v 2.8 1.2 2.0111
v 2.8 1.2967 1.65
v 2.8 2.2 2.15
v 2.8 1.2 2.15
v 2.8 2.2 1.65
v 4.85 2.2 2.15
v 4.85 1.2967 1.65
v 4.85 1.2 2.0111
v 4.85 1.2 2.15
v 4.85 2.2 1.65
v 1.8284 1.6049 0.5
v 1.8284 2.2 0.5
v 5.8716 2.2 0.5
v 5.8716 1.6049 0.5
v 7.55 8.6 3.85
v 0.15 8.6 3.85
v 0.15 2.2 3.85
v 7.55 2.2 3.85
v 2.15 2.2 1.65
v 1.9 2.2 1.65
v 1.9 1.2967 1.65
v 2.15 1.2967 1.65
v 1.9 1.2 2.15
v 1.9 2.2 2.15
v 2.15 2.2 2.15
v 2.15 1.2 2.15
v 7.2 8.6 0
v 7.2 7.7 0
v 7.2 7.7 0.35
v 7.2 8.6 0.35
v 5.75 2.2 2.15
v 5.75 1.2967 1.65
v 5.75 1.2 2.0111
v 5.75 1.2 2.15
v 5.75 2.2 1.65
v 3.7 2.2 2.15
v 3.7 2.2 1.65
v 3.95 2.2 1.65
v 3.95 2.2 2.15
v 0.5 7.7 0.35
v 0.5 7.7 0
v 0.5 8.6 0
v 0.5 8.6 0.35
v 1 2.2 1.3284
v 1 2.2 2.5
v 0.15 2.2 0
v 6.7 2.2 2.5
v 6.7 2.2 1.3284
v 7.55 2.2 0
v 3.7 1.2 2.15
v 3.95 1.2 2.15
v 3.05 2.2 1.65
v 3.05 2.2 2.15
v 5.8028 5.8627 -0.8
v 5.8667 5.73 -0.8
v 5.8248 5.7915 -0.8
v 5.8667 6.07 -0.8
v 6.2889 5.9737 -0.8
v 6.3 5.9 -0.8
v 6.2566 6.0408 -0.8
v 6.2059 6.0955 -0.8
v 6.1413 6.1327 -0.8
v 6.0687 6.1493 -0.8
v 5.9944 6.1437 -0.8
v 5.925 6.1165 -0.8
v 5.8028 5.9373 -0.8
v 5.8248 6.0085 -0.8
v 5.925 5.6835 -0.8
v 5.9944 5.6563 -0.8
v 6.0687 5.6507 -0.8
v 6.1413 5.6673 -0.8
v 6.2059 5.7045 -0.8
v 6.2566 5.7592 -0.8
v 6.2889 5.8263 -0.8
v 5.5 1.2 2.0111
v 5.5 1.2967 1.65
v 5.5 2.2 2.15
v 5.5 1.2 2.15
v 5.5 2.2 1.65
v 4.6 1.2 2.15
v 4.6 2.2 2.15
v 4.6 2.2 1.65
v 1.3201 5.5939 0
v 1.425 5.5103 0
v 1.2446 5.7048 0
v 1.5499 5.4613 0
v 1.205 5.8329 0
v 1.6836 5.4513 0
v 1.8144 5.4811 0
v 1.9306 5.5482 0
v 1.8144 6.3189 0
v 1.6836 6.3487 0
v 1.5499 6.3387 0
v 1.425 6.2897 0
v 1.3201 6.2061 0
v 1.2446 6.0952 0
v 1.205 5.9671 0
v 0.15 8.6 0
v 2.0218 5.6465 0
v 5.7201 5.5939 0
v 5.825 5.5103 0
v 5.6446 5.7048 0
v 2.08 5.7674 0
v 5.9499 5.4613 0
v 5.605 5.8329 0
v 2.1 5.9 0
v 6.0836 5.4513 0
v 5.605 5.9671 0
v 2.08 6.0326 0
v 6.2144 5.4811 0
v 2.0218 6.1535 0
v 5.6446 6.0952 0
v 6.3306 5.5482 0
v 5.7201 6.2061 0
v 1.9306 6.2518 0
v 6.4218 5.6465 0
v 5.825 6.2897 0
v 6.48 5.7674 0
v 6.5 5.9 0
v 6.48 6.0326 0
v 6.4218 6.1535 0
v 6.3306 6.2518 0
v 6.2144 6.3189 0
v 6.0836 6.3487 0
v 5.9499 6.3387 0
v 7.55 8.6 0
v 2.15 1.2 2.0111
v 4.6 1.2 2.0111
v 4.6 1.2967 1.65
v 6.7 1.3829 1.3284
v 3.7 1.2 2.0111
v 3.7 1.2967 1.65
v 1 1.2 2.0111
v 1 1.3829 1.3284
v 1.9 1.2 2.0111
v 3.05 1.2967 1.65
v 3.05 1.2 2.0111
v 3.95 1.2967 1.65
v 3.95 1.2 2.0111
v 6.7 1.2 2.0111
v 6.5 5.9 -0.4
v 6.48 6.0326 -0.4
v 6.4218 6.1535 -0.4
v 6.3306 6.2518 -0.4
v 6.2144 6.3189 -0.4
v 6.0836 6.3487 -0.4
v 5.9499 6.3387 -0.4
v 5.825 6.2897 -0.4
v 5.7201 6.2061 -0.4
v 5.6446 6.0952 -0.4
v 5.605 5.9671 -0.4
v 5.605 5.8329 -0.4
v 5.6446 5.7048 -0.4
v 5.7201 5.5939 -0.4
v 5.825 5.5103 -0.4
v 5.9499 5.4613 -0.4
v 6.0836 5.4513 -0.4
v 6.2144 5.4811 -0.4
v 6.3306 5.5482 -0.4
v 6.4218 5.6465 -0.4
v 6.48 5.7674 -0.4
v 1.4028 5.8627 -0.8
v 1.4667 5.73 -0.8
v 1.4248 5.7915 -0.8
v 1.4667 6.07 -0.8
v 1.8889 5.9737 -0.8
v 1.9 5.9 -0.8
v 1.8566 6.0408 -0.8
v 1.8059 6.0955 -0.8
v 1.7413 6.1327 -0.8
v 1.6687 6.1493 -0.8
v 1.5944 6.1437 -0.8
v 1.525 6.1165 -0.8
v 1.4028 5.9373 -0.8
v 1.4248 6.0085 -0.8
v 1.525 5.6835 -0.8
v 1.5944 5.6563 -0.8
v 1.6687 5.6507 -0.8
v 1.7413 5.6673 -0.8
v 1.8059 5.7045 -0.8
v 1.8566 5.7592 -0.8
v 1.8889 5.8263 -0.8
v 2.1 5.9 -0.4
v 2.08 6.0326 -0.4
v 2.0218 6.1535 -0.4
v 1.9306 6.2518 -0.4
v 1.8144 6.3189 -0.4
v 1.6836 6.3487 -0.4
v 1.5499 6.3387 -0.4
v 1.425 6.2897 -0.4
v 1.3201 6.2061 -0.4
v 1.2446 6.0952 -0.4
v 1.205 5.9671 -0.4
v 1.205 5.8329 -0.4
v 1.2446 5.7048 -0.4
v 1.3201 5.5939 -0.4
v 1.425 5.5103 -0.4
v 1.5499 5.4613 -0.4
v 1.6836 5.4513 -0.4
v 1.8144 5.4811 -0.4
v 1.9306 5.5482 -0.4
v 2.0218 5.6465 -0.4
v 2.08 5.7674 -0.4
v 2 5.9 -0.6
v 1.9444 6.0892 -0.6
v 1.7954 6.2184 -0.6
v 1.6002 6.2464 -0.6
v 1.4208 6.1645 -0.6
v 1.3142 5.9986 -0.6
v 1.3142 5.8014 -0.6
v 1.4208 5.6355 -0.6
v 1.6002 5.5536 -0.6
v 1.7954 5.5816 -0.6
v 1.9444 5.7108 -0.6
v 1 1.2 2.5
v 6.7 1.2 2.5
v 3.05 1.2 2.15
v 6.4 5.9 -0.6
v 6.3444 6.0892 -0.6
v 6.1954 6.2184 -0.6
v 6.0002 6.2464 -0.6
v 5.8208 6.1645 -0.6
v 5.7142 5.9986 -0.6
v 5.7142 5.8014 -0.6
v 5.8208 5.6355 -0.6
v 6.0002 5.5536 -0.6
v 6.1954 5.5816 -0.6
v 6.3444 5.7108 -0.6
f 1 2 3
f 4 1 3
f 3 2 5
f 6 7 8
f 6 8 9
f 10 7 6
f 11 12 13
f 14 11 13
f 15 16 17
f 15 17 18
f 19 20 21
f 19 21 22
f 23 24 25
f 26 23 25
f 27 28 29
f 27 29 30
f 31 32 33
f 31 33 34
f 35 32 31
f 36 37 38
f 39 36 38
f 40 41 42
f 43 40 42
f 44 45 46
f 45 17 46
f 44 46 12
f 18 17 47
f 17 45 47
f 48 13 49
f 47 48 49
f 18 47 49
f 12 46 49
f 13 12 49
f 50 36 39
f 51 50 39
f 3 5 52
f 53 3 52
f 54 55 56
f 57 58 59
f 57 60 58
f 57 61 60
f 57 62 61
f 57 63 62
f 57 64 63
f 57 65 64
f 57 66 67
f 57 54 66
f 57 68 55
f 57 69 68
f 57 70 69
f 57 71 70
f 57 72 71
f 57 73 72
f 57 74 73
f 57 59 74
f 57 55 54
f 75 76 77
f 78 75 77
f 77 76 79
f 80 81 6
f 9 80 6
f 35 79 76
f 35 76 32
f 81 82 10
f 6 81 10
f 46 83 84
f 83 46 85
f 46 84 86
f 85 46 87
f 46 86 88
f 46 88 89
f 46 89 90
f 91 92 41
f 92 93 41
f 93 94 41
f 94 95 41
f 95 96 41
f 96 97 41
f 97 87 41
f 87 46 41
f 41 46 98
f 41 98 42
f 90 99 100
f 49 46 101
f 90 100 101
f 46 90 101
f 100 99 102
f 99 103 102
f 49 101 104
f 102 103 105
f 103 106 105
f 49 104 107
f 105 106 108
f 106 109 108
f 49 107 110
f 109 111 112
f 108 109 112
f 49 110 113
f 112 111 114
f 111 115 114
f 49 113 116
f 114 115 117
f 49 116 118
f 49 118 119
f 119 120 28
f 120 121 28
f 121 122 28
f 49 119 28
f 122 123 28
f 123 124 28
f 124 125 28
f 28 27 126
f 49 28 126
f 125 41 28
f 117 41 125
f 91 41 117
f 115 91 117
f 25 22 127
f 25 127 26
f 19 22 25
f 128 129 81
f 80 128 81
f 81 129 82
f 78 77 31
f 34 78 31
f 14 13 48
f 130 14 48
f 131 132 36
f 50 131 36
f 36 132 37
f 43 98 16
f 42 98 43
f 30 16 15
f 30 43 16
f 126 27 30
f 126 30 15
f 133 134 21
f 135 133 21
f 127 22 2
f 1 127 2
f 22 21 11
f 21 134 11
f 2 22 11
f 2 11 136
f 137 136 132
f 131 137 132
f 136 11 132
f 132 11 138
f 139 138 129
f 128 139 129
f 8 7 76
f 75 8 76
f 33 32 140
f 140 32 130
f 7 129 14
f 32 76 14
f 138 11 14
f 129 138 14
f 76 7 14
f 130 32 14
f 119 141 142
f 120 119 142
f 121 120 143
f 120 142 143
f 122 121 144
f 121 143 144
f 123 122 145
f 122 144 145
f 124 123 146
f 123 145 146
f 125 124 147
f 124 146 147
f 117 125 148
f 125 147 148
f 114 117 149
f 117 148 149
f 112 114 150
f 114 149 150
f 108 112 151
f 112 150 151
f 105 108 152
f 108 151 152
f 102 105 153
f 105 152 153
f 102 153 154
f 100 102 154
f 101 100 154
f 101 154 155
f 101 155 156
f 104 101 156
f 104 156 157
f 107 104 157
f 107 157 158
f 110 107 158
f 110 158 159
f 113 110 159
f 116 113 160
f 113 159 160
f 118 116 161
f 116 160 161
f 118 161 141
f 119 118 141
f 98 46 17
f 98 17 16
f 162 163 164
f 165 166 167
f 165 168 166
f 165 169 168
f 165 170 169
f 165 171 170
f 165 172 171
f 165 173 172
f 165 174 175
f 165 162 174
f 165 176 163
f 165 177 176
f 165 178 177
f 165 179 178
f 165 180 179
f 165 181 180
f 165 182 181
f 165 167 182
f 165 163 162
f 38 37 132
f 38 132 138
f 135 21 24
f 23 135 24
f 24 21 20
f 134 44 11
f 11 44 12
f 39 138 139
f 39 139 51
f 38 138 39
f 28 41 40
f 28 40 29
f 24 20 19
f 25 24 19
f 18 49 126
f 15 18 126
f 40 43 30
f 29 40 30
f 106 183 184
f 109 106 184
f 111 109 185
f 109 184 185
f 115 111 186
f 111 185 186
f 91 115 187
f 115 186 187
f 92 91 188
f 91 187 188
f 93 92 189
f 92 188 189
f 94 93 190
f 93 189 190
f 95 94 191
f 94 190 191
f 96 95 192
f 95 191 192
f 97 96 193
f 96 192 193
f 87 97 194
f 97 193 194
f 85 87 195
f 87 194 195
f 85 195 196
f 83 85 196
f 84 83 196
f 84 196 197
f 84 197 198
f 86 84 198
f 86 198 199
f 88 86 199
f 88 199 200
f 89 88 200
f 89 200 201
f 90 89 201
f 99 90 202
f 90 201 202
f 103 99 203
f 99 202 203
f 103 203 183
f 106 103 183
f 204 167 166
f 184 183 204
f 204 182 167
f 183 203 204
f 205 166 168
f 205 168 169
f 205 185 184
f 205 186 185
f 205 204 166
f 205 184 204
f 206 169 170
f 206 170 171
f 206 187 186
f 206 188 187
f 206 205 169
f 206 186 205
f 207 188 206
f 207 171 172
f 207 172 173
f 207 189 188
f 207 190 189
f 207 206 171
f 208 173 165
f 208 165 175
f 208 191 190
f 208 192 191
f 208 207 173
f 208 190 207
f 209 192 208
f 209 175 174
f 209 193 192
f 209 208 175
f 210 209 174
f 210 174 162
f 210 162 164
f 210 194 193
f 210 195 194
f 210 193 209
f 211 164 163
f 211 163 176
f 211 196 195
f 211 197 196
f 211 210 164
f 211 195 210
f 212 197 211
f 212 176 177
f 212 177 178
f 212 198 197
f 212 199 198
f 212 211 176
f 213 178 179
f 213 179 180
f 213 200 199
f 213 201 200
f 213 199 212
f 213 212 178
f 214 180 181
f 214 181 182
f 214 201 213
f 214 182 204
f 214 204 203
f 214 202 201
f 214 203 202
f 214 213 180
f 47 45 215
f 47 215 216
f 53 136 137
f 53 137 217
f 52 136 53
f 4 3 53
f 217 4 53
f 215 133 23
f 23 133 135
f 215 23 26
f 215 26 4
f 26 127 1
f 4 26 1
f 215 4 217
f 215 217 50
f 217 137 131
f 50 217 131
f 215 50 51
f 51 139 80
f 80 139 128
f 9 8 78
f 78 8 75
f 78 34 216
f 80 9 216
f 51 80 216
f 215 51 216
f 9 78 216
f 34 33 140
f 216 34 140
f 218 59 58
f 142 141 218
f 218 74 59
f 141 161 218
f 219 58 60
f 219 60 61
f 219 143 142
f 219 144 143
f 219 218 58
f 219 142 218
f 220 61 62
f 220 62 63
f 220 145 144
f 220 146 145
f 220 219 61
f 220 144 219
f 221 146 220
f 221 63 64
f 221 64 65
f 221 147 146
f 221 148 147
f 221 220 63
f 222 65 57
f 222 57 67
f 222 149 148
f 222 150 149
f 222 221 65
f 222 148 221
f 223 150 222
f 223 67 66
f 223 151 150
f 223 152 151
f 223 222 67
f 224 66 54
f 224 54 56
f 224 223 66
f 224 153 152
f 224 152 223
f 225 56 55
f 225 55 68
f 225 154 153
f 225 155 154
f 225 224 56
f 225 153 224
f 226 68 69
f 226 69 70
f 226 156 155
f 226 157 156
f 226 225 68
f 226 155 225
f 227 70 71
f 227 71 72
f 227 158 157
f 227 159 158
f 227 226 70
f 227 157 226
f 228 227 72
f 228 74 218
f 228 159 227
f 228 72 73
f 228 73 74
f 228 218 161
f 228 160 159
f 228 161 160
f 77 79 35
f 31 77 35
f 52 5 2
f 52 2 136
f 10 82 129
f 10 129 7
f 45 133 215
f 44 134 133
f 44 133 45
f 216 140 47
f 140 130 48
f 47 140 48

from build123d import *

# Parameters (mm, degrees)
BOX039_W               = 7.4
BOX039_H               = 1
BOX039_DEPTH           = 3.95
BOX038_W               = 6.7
BOX038_H               = 2
BOX038_DEPTH           = 0.45
CYLINDER008_R          = 0.45
CYLINDER008_DEPTH      = 0.4
CYLINDER_R             = 0.45
CYLINDER_DEPTH         = 0.4
BOX028_W               = 7.4
BOX028_H               = 7
BOX028_DEPTH           = 3.85
BOX037_W               = 0.25
BOX037_H               = 2.2
BOX037_DEPTH           = 0.5
BOX036_W               = 0.25
BOX036_H               = 2.2
BOX036_DEPTH           = 0.5
BOX035_W               = 0.25
BOX035_H               = 2.2
BOX035_DEPTH           = 0.5
BOX034_W               = 0.25
BOX034_H               = 2.2
BOX034_DEPTH           = 0.5
BOX033_W               = 0.25
BOX033_H               = 2.2
BOX033_DEPTH           = 0.5
BOX032_W               = 2
BOX032_H               = 3
BOX032_DEPTH           = 2
BOX032_PLACEMENT_ANGLE = 45
BOX031_W               = 2
BOX031_H               = 3
BOX031_DEPTH           = 2
BOX031_PLACEMENT_ANGLE = 45
BOX029_W               = 5.7
BOX029_H               = 1
BOX029_DEPTH           = 2
BOX029_PLACEMENT_ANGLE = 15
BOX030_W               = 5.7
BOX030_H               = 1
BOX030_DEPTH           = 2


with BuildPart() as cube031:
    # Box039 → Box039 (new body)
    with BuildSketch(Plane(origin=(0.15, 8.6, -0.1), x_dir=(1, 0, 0), z_dir=(0, 0, 1))):
        with Locations((3.7, 0.5)):
            Rectangle(BOX039_W, BOX039_H)
    extrude(amount=BOX039_DEPTH)


with BuildPart() as cube030:
    # Box038 → Box038 (new body)
    with BuildSketch(Plane(origin=(0.5, 7.7, -0.1), x_dir=(1, 0, 0), z_dir=(0, 0, 1))):
        with Locations((3.35, 1)):
            Rectangle(BOX038_W, BOX038_H)
    extrude(amount=BOX038_DEPTH)


with BuildPart() as cone001:
    # Cone001 → Cone001 (revolve)
    with BuildSketch(Plane(origin=(6.05, 5.9, -0.8), x_dir=(1, 0, 0), z_dir=(0, -1, 0))):
        Polygon((0, 0), (0.25, 0), (0.45, 0.4), (0, 0.4), align=None)
    revolve(axis=Axis((6.05, 5.9, -0.8), (0, 0, 1)))


with BuildPart() as fusion002:
    # Cylinder008 → Cylinder008 (new body)
    with BuildSketch(Plane(origin=(6.05, 5.9, -0.4), x_dir=(1, 0, 0), z_dir=(0, 0, 1))):
        Circle(CYLINDER008_R)
    extrude(amount=CYLINDER008_DEPTH)

    # Fusion002: union Cone001
    add(cone001.part)


with BuildPart() as cone:
    # Cone → Cone (revolve)
    with BuildSketch(Plane(origin=(1.65, 5.9, -0.8), x_dir=(1, 0, 0), z_dir=(0, -1, 0))):
        Polygon((0, 0), (0.25, 0), (0.45, 0.4), (0, 0.4), align=None)
    revolve(axis=Axis((1.65, 5.9, -0.8), (0, 0, 1)))


with BuildPart() as fusion:
    # Cylinder → Cylinder (new body)
    with BuildSketch(Plane(origin=(1.65, 5.9, -0.4), x_dir=(1, 0, 0), z_dir=(0, 0, 1))):
        Circle(CYLINDER_R)
    extrude(amount=CYLINDER_DEPTH)

    # Fusion: union Cone
    add(cone.part)


with BuildPart() as fusion004:
    # Box028 → Box028 (new body)
    with BuildSketch(Plane(origin=(0.15, 2.2, 0), x_dir=(1, 0, 0), z_dir=(0, 0, 1))):
        with Locations((3.7, 3.5)):
            Rectangle(BOX028_W, BOX028_H)
    extrude(amount=BOX028_DEPTH)

    # Fusion003: union Fusion
    add(fusion.part)

    # Fusion004: union Fusion002
    add(fusion002.part)


with BuildPart() as cube029:
    # Box037 → Box037 (new body)
    with BuildSketch(Plane(origin=(5.5, 0.1, 1.65), x_dir=(1, 0, 0), z_dir=(0, 0, 1))):
        with Locations((0.125, 1.1)):
            Rectangle(BOX037_W, BOX037_H)
    extrude(amount=BOX037_DEPTH)


with BuildPart() as cube028:
    # Box036 → Box036 (new body)
    with BuildSketch(Plane(origin=(4.6, 0.1, 1.65), x_dir=(1, 0, 0), z_dir=(0, 0, 1))):
        with Locations((0.125, 1.1)):
            Rectangle(BOX036_W, BOX036_H)
    extrude(amount=BOX036_DEPTH)


with BuildPart() as cube027:
    # Box035 → Box035 (new body)
    with BuildSketch(Plane(origin=(3.7, 0.1, 1.65), x_dir=(1, 0, 0), z_dir=(0, 0, 1))):
        with Locations((0.125, 1.1)):
            Rectangle(BOX035_W, BOX035_H)
    extrude(amount=BOX035_DEPTH)


with BuildPart() as cube026:
    # Box034 → Box034 (new body)
    with BuildSketch(Plane(origin=(2.8, 0.1, 1.65), x_dir=(1, 0, 0), z_dir=(0, 0, 1))):
        with Locations((0.125, 1.1)):
            Rectangle(BOX034_W, BOX034_H)
    extrude(amount=BOX034_DEPTH)


with BuildPart() as cube025:
    # Box033 → Box033 (new body)
    with BuildSketch(Plane(origin=(1.9, 0.1, 1.65), x_dir=(1, 0, 0), z_dir=(0, 0, 1))):
        with Locations((0.125, 1.1)):
            Rectangle(BOX033_W, BOX033_H)
    extrude(amount=BOX033_DEPTH)


with BuildPart() as cube024:
    # Box032 → Box032 (new body)
    with BuildSketch(Plane.XY):
        with Locations((1, 1.5)):
            Rectangle(BOX032_W, BOX032_H)
    extrude(amount=BOX032_DEPTH)


with BuildPart() as cube024_1:
    # Box032 placement: moved
    add(cube024.part.moved(Location((6.8, 0, -1.4))).rotate(Axis((6.8, 0, -1.4), (0, -1, 0)), BOX032_PLACEMENT_ANGLE))


with BuildPart() as cube023:
    # Box031 → Box031 (new body)
    with BuildSketch(Plane.XY):
        with Locations((1, 1.5)):
            Rectangle(BOX031_W, BOX031_H)
    extrude(amount=BOX031_DEPTH)


with BuildPart() as cube023_1:
    # Box031 placement: moved
    add(cube023.part.moved(Location((-0.5, 0, 0))).rotate(Axis((-0.5, 0, 0), (0, 1, 0)), BOX031_PLACEMENT_ANGLE))


with BuildPart() as cube021:
    # Box029 → Box029 (new body)
    with BuildSketch(Plane.XY):
        with Locations((2.85, 0.5)):
            Rectangle(BOX029_W, BOX029_H)
    extrude(amount=BOX029_DEPTH)


with BuildPart() as cube021_1:
    # Box029 placement: moved
    add(cube021.part.moved(Location((1, 0.65, 0.2))).rotate(Axis((1, 0.65, 0.2), (1, 0, 0)), BOX029_PLACEMENT_ANGLE))


with BuildPart() as plastic_guts:
    # Box030 → Box030 (new body)
    with BuildSketch(Plane(origin=(1, 1.2, 0.5), x_dir=(1, 0, 0), z_dir=(0, 0, 1))):
        with Locations((2.85, 0.5)):
            Rectangle(BOX030_W, BOX030_H)
    extrude(amount=BOX030_DEPTH)

    # Cut026: cut Cube021
    add(cube021_1.part, mode=Mode.SUBTRACT)

    # Cut027: cut Cube023
    add(cube023_1.part, mode=Mode.SUBTRACT)

    # Cut028: cut Cube024
    add(cube024_1.part, mode=Mode.SUBTRACT)

    # Cut029: cut Cube025
    add(cube025.part, mode=Mode.SUBTRACT)

    # Cut030: cut Cube026
    add(cube026.part, mode=Mode.SUBTRACT)

    # Cut031: cut Cube027
    add(cube027.part, mode=Mode.SUBTRACT)

    # Cut032: cut Cube028
    add(cube028.part, mode=Mode.SUBTRACT)

    # Cut033: cut Cube029
    add(cube029.part, mode=Mode.SUBTRACT)

    # Fusion005: union Fusion004
    add(fusion004.part)

    # Cut034: cut Cube030
    add(cube030.part, mode=Mode.SUBTRACT)

    # Cut035: cut Cube031
    add(cube031.part, mode=Mode.SUBTRACT)


solid = plastic_guts.part
